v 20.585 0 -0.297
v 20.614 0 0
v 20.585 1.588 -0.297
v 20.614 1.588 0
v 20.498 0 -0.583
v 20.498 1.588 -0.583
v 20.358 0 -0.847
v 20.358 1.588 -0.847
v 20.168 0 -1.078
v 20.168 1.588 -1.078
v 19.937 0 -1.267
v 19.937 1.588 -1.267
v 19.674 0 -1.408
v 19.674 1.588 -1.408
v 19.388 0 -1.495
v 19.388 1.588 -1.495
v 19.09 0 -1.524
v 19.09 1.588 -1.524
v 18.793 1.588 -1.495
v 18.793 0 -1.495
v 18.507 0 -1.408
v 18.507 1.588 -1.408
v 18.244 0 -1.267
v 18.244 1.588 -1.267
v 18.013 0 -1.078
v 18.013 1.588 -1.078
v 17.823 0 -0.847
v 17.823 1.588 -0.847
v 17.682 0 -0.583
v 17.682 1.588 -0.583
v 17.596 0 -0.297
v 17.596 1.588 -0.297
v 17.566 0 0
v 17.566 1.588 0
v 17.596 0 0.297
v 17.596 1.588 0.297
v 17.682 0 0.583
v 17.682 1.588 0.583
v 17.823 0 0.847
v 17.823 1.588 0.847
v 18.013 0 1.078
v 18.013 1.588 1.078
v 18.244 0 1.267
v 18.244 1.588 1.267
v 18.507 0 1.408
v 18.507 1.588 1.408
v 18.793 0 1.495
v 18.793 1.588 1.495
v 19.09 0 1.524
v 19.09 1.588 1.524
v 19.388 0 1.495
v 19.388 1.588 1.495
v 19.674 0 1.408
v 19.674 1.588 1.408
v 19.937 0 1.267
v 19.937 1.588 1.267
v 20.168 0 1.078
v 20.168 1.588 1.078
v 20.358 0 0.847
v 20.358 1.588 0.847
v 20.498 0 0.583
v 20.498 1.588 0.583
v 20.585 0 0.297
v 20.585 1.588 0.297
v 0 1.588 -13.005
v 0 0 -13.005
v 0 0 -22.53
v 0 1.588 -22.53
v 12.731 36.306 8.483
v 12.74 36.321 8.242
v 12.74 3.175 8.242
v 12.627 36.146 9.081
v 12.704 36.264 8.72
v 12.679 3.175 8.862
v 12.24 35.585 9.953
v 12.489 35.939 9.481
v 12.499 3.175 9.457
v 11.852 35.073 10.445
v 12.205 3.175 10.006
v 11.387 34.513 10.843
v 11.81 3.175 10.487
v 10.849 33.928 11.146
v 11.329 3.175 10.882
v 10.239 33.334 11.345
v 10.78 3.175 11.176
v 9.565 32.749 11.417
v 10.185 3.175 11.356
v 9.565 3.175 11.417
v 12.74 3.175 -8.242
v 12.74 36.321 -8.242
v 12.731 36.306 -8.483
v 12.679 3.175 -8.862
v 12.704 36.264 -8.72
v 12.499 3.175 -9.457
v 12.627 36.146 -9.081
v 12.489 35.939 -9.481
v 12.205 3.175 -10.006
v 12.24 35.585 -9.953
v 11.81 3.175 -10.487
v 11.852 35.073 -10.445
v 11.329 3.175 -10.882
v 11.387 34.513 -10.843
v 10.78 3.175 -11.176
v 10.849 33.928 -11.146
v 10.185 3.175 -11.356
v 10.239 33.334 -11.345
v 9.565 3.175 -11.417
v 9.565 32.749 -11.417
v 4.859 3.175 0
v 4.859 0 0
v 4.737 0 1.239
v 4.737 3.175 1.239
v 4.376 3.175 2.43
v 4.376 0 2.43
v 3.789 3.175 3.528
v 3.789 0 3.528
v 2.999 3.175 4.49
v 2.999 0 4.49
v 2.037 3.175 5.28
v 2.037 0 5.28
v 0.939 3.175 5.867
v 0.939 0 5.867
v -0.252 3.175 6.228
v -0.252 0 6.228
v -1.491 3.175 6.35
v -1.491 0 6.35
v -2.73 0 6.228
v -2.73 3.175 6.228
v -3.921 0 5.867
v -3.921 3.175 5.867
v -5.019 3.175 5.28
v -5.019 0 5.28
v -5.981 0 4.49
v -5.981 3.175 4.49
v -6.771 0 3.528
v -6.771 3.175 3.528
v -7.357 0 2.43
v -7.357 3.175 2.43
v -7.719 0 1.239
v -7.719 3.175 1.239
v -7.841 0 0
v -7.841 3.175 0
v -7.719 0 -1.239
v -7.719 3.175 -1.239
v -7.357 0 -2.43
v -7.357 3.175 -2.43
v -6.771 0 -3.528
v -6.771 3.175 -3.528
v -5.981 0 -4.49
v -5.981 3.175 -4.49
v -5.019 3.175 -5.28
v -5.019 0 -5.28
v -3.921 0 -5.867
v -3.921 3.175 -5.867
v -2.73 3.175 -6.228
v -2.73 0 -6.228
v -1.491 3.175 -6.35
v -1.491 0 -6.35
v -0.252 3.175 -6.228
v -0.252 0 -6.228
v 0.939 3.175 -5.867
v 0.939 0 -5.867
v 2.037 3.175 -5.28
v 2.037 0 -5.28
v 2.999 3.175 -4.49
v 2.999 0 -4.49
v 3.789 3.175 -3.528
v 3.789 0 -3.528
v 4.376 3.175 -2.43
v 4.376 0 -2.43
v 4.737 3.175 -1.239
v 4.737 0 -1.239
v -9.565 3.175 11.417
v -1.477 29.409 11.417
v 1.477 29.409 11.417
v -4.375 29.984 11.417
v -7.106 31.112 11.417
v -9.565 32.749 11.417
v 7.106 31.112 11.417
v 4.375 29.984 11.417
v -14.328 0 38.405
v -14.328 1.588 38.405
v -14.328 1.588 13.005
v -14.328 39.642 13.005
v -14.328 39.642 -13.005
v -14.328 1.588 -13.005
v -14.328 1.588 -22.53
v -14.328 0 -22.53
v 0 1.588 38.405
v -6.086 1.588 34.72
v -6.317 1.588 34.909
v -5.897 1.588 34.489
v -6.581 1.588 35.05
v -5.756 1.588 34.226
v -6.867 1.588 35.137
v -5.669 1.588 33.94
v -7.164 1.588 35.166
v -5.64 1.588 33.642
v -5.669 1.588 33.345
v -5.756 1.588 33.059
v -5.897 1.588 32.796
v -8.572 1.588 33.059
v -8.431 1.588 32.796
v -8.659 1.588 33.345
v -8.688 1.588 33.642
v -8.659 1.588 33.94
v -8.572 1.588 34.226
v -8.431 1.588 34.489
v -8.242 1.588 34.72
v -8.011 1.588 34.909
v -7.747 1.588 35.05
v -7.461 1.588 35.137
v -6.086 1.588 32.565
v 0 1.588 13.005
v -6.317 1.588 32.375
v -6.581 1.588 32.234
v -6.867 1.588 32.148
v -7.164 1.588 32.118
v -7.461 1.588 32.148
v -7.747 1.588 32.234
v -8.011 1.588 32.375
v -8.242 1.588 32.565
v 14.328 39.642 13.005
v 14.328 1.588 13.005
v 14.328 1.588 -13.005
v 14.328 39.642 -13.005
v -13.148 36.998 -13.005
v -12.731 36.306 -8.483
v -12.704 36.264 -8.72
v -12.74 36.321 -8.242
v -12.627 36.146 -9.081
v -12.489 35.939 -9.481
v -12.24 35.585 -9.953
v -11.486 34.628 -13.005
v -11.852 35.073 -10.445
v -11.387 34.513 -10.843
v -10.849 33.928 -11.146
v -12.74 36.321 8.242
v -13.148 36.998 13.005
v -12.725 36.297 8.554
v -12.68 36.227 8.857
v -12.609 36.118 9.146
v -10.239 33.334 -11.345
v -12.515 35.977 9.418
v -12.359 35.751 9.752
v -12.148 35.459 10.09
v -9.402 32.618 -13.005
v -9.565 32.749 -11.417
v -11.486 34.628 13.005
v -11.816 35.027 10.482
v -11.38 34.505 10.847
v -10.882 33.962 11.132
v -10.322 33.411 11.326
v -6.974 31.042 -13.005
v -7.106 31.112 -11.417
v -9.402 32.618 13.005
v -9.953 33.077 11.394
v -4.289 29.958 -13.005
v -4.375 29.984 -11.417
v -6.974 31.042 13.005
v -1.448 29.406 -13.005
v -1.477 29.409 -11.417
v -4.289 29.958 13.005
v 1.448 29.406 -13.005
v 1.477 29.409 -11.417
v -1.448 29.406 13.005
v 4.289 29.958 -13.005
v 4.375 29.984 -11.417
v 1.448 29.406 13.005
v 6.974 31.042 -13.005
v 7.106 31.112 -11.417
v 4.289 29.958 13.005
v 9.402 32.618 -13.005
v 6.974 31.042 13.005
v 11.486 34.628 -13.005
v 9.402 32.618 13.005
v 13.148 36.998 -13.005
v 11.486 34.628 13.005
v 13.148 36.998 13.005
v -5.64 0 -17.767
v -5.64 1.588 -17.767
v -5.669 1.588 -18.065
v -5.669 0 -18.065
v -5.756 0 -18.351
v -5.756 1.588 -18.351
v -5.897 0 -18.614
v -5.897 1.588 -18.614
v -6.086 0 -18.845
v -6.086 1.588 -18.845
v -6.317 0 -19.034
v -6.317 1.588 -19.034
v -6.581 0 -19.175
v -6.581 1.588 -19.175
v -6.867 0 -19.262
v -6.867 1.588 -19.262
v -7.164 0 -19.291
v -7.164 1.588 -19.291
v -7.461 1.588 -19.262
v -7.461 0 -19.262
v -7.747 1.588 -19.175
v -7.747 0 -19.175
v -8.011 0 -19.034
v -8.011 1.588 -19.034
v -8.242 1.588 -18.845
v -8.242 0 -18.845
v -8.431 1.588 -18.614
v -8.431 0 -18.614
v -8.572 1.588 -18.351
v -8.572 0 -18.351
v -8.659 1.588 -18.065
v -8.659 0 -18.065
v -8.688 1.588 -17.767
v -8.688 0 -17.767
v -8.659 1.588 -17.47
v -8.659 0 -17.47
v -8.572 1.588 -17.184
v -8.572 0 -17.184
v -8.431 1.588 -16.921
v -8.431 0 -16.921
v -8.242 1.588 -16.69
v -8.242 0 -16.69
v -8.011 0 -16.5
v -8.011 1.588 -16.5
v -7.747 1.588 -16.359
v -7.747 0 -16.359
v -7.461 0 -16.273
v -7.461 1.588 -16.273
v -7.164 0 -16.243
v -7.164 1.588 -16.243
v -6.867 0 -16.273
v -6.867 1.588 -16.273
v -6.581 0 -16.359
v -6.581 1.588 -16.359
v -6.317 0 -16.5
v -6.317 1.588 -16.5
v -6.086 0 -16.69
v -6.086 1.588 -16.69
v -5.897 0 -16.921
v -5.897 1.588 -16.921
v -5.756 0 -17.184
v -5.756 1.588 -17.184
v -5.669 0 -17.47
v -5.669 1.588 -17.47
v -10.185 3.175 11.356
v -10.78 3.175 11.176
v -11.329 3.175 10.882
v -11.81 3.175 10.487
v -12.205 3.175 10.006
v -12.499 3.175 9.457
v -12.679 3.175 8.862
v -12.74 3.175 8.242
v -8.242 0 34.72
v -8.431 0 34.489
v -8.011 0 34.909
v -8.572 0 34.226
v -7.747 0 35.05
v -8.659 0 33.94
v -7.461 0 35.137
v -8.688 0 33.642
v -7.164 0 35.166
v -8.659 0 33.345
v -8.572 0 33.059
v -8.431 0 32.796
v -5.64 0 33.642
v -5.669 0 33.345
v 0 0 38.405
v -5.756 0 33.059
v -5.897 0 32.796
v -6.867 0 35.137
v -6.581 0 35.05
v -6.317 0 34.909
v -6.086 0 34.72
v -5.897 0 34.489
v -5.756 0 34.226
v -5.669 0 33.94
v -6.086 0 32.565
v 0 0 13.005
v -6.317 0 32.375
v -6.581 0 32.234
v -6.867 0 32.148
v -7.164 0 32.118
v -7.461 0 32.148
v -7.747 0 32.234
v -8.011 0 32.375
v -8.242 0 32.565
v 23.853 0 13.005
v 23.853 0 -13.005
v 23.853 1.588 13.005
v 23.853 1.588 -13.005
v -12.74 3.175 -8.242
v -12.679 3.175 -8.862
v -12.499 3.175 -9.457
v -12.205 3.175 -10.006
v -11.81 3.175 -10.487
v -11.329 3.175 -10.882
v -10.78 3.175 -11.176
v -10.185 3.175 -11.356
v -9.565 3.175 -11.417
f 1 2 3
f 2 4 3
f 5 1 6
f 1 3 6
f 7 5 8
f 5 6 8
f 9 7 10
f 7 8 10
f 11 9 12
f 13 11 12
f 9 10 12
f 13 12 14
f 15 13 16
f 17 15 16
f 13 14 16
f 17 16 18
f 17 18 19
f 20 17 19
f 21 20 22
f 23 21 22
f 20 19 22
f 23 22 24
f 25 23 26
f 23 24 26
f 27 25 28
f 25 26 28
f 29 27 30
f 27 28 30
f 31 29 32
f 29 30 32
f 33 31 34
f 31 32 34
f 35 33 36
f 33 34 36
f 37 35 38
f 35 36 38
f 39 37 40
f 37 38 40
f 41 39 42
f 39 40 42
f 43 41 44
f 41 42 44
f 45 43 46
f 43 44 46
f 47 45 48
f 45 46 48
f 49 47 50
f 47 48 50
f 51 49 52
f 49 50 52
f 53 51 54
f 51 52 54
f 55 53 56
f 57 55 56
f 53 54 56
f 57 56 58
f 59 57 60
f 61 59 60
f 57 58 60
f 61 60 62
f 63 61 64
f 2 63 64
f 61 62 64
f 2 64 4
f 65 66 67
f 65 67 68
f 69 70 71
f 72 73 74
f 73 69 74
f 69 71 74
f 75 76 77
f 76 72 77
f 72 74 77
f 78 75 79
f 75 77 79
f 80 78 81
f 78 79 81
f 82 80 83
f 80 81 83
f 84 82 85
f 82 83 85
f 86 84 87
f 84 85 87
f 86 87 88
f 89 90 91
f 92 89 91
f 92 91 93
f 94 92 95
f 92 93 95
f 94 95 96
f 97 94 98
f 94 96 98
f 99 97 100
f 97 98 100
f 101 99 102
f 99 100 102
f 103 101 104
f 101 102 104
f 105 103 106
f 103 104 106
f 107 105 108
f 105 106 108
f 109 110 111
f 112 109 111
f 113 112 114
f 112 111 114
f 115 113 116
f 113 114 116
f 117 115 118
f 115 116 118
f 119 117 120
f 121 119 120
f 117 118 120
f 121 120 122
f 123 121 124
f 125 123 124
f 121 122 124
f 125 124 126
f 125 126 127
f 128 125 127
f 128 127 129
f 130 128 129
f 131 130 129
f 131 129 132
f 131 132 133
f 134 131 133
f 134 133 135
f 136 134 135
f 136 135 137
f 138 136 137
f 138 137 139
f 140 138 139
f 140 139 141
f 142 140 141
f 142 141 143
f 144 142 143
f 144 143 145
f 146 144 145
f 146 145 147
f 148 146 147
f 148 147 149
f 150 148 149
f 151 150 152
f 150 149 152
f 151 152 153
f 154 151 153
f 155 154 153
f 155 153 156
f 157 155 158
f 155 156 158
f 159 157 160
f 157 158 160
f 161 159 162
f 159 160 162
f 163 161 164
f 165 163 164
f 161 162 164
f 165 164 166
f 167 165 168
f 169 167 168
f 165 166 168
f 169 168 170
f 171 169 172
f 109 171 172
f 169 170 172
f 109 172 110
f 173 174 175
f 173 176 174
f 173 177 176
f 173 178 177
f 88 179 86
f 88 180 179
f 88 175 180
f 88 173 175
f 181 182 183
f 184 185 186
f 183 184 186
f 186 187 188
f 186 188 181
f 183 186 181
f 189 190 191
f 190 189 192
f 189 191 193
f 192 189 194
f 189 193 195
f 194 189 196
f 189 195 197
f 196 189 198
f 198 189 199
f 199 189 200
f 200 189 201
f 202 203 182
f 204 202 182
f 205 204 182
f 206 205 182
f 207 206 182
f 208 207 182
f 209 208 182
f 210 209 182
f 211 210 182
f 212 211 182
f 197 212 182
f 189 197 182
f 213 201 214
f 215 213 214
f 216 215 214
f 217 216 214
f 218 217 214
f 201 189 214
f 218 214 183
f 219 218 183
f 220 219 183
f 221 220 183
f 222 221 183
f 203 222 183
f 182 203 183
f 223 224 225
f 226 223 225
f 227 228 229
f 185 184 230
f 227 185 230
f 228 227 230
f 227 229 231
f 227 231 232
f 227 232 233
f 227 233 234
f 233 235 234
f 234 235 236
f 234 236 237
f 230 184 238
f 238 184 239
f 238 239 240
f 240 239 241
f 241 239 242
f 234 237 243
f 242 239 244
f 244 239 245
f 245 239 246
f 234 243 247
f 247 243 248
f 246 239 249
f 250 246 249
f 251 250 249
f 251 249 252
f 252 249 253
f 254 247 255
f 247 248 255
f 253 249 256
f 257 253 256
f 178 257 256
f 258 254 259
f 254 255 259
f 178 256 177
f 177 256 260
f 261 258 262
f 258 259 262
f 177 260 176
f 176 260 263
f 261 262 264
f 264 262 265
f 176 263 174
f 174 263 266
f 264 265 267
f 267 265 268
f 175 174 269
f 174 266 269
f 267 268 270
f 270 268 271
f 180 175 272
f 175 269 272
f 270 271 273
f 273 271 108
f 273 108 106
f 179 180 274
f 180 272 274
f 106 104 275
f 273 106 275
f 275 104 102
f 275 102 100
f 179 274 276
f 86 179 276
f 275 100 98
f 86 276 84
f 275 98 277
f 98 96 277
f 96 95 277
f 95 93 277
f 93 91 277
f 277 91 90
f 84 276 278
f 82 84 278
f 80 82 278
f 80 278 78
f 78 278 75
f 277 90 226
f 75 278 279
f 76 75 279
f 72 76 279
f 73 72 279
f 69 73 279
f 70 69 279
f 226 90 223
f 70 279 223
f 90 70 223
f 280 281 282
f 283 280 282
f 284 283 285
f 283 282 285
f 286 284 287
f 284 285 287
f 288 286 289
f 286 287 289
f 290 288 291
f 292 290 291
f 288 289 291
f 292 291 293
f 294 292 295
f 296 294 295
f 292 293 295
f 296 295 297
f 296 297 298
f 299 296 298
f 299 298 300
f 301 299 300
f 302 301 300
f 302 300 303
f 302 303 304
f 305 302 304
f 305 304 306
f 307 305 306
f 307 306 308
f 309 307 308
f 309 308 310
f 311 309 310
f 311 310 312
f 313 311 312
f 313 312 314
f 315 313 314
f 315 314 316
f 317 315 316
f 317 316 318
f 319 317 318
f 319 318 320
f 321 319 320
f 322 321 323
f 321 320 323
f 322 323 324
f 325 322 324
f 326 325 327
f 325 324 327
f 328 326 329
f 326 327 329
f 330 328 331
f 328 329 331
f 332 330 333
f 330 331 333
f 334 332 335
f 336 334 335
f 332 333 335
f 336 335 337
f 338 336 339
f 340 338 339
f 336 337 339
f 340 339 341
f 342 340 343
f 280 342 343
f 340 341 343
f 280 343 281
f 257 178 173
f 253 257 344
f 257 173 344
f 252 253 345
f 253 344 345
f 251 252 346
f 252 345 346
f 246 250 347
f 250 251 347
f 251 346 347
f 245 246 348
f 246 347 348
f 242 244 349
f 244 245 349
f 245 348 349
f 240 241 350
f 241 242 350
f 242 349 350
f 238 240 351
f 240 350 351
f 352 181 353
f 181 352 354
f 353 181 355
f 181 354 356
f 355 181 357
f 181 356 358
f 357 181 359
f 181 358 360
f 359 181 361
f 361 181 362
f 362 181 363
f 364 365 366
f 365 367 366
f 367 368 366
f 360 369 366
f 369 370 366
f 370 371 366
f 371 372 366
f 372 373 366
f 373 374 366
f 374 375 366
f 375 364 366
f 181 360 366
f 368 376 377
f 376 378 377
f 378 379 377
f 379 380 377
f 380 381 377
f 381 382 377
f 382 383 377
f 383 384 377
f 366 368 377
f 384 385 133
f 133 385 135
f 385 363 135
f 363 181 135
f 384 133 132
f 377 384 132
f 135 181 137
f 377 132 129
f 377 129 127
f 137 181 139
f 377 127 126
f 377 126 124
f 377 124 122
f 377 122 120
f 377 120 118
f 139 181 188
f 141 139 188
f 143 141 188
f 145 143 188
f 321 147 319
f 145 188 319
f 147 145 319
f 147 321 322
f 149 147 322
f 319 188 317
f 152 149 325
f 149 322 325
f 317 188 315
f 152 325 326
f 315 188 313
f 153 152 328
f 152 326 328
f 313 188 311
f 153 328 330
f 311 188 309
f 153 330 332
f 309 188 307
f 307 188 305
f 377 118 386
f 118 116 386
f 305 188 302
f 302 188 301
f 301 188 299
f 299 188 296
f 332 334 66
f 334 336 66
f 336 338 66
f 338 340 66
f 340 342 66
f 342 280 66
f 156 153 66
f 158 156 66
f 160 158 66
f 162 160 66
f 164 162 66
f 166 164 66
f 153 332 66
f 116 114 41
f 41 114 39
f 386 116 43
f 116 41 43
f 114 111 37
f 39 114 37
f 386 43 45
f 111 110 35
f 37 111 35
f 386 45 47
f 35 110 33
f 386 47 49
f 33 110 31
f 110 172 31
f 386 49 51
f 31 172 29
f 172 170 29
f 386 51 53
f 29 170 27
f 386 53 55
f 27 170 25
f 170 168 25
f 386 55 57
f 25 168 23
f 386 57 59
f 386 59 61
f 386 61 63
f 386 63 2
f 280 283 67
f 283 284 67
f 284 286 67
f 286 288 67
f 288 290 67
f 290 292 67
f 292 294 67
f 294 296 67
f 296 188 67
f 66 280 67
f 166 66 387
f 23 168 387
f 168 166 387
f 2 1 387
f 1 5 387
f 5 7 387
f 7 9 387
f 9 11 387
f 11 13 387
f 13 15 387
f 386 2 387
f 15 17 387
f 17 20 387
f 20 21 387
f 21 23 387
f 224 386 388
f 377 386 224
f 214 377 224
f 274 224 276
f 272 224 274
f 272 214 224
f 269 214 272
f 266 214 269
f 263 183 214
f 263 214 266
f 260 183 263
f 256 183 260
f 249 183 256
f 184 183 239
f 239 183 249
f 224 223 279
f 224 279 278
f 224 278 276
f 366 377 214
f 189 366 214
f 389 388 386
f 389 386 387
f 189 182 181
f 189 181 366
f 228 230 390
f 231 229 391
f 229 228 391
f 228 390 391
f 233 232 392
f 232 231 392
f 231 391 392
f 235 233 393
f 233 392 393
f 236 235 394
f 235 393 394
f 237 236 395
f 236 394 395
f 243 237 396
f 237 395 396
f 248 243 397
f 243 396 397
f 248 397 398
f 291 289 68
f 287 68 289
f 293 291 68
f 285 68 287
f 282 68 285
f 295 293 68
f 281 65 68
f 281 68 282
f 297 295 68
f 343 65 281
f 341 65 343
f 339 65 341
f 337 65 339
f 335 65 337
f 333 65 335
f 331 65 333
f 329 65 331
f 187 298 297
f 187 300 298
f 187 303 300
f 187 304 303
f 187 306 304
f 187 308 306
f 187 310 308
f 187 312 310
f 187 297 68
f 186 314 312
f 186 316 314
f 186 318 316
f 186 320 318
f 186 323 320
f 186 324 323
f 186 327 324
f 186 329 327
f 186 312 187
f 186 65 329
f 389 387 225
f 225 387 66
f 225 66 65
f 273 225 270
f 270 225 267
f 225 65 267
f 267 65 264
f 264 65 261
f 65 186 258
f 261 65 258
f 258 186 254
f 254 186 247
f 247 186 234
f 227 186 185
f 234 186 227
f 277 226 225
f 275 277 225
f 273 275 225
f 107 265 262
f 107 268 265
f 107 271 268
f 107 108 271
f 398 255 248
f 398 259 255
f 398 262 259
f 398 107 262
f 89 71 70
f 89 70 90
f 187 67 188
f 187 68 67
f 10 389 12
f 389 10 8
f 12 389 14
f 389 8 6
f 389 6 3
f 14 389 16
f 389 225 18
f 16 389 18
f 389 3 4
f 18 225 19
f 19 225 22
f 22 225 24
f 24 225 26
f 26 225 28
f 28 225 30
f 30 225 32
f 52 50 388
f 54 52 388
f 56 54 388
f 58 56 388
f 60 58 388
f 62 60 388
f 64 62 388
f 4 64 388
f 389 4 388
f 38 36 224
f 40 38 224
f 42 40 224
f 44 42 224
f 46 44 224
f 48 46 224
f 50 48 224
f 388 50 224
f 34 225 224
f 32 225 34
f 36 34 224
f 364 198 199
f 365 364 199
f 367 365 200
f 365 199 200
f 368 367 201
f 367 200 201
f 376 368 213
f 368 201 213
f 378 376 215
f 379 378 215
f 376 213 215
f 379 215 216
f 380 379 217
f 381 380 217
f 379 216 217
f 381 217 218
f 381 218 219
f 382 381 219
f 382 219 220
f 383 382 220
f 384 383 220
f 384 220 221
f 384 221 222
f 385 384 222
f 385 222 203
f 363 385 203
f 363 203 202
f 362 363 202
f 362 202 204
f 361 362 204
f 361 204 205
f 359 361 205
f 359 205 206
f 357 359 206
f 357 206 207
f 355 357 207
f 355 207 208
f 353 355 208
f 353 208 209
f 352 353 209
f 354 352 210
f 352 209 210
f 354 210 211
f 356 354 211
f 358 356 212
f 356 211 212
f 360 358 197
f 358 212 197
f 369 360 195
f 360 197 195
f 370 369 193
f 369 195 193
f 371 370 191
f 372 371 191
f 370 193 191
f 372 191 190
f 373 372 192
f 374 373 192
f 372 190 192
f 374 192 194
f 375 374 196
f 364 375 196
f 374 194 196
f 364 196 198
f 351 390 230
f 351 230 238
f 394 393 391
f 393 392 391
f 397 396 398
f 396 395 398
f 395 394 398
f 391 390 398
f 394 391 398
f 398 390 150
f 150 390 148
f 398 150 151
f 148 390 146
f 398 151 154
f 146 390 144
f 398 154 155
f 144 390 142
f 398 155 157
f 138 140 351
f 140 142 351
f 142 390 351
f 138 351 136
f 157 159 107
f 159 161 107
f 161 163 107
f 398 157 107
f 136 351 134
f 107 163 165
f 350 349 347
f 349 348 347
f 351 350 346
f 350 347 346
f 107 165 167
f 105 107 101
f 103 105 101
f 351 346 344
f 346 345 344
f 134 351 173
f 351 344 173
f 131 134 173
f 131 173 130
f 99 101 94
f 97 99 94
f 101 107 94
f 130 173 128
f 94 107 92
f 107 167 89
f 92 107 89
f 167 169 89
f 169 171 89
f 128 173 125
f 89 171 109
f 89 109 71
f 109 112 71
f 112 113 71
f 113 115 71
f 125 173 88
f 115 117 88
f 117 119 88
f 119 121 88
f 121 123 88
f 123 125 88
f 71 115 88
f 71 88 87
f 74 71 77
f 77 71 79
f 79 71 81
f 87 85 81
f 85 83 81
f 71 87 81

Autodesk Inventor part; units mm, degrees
ref_plane "YZ Plane" through (0, 0, 0) normal (1, 0, 0) x (0, 1, 0)
ref_plane "XZ Plane" through (0, 0, 0) normal (0, 1, 0) x (-1, 0, 0)
ref_plane "XY Plane" through (0, 0, 0) normal (0, 0, 1) x (1, 0, 0)
sketch "Sketch1" plane through (0, 0, 0) normal (0, 1, 0) x (-1, 0, 0)
  line L0 (-14.3278, -13.0048) -> (14.3278, -13.0048)
  line L1 (14.3278, -13.0048) -> (14.3278, 13.0048)
  line L2 (14.3278, 13.0048) -> (-14.3278, 13.0048)
  line L3 (-14.3278, 13.0048) -> (-14.3278, -13.0048)
  line L4 (-14.3278, -13.0048) -> (14.3278, 13.0048) construction
  line L5 (14.3278, -13.0048) -> (-14.3278, 13.0048) construction
  point P0 (0, 0)
  dimension "d0" = 28.6557
  dimension "d1" = 26.0096
extrude "Extrusion1" add sketch "Sketch1" along normal blind 40.1371
shell "Shell1" thickness 1.5875 removed faces 2 at (4.7759, 0, 4.3349) at (4.7759, 40.1371, 4.3349)
sketch "Sketch2" plane through (0, 0, 0) normal (0, 0, 1) x (1, 0, 0)
  line L0 (0, 0) -> (0, 44.45)
  circle A0 centre (0, 44.45) radius 15.113
  dimension "d5" = 44.45
  dimension "d6" = 30.226
extrude "Extrusion2" cut sketch "Sketch2" along normal mid plane 39.1617
sketch "Sketch4" plane through (-14.3278, 0, -13.0048) normal (-1, 0, 0) x (0, 0, 1)
  line L0 (26.0096, 0) -> (26.0096, 39.6421) projected
  line L1 (0, 0) -> (26.0096, 0)
  line L2 (26.0096, 0) -> (26.0096, 3.175)
  line L3 (26.0096, 3.175) -> (0, 3.175)
  line L4 (0, 3.175) -> (0, 0)
  point P0 (13.0048, 0)
extrude "Extrusion4" [suppressed]
sketch "Sketch5" plane through (0, 0, 0) normal (0, -1, 0) x (1, 0, 0)
  line L0 (12.7403, 11.4173) -> (-12.7403, 11.4173)
  line L1 (-12.7403, 11.4173) -> (-12.7403, -11.4173)
  line L2 (-12.7403, -11.4173) -> (12.7403, -11.4173)
  line L3 (12.7403, -11.4173) -> (12.7403, 11.4173)
  point P0 (0, 0)
extrude "Extrusion5" add sketch "Sketch5" against normal blind 3.175
sketch "Sketch6" plane through (0, 0, 0) normal (0, -1, 0) x (1, 0, 0)
  line L0 (0, 0) -> (-1.4907, 0)
  circle A0 centre (-1.4907, 0) radius 6.35
  dimension "d22" = 1.4907
  dimension "d23" = 12.7
extrude "Extrusion6" cut sketch "Sketch6" against normal blind 3.175
fillet "Fillet1" radius 3.175 4 edges at (-12.7403, 19.7478, -11.4173) (-12.7403, 19.7478, 11.4173) (12.7403, 19.7478, 11.4173) (12.7403, 19.7478, -11.4173)
sketch "Sketch11" plane through (14.3278, 0, 13.0048) normal (1, 0, 0) x (0, 0, -1)
  line L0 (0, 0) -> (0, 39.6421) projected
  line L1 (26.0096, 0) -> (26.0096, 39.6421) projected
  line L2 (0, 0) -> (26.0096, 0)
  line L3 (26.0096, 0) -> (26.0096, 1.5875)
  line L4 (26.0096, 1.5875) -> (0, 1.5875)
  line L5 (0, 1.5875) -> (0, 0)
  point P0 (13.0048, 0)
  dimension "d36" = 1.5875
extrude "Extrusion11" add sketch "Sketch11" along normal blind 9.525
sketch "Sketch12" plane through (0, 44.45, -13.0048) normal (0, 0, -1) x (-1, 0, 0)
  line L0 (-23.8528, -44.45) -> (14.3278, -44.45) projected
  line L1 (0, -44.45) -> (0, -42.8625) projected
  line L2 (14.3278, -44.45) -> (0, -44.45)
  line L3 (0, -44.45) -> (0, -42.8625)
  line L4 (0, -42.8625) -> (14.3278, -42.8625)
  line L5 (14.3278, -42.8625) -> (14.3278, -44.45)
  dimension "d39" = 1.5875
extrude "Extrusion12" add sketch "Sketch12" along normal blind 9.525
sketch "Sketch13" plane through (0, 44.45, 13.0048) normal (0, 0, 1) x (1, 0, 0)
  point P0 (0, -44.45)
sketch "Sketch14" plane through (-14.3278, 0, 13.0048) normal (-1, 0, 0) x (0, 0, 1)
  point P0 (-13.0048, 0)
sketch "Sketch15" plane through (0, 44.45, 13.0048) normal (0, 0, 1) x (1, 0, 0)
  line L0 (-14.3278, -44.45) -> (23.8528, -44.45) projected
  line L1 (-14.3278, -44.45) -> (0, -44.45)
  line L2 (0, -44.45) -> (0, -42.8625)
  line L3 (0, -42.8625) -> (-14.3278, -42.8625)
  line L4 (-14.3278, -42.8625) -> (-14.3278, -44.45)
  point P0 (0, -44.45)
  dimension "d42" = 1.5875
extrude "Extrusion13" add sketch "Sketch15" along normal blind 25.4
sketch "Sketch16" plane through (-14.3278, 1.5875, -13.0048) normal (0, 1, 0) x (1, 0, 0)
  line L0 (14.3278, 0) -> (14.3278, 9.525) projected
  line L1 (0, -51.4096) -> (0, 9.525) projected
  line L2 (14.3278, 9.525) -> (0, 9.525) projected
  line L3 (14.3278, -26.0096) -> (14.3278, -51.4096) projected
  line L4 (38.1807, -26.0096) -> (38.1807, 0) projected
  line L5 (14.3278, -26.0096) -> (38.1807, -26.0096) projected
  line L6 (38.1807, 0) -> (14.3278, 0) projected
  line L7 (38.1807, 0) -> (33.4182, 0)
  circle A0 centre (7.1639, 4.7625) radius 1.524
  circle A1 centre (33.4182, -13.0048) radius 1.524
  circle A2 centre (7.1639, -46.6471) radius 1.524
  point P0 (14.3278, -13.0048)
  dimension "d45" = 4.7625
  dimension "d47" = 3.048
  dimension "d48" = 3.048
  dimension "d63" = 3.048
extrude "Extrusion14" cut sketch "Sketch16" against normal blind 25.4
properties part number "DPLX_P016_Spark_Gap_Camera_Shroud"
